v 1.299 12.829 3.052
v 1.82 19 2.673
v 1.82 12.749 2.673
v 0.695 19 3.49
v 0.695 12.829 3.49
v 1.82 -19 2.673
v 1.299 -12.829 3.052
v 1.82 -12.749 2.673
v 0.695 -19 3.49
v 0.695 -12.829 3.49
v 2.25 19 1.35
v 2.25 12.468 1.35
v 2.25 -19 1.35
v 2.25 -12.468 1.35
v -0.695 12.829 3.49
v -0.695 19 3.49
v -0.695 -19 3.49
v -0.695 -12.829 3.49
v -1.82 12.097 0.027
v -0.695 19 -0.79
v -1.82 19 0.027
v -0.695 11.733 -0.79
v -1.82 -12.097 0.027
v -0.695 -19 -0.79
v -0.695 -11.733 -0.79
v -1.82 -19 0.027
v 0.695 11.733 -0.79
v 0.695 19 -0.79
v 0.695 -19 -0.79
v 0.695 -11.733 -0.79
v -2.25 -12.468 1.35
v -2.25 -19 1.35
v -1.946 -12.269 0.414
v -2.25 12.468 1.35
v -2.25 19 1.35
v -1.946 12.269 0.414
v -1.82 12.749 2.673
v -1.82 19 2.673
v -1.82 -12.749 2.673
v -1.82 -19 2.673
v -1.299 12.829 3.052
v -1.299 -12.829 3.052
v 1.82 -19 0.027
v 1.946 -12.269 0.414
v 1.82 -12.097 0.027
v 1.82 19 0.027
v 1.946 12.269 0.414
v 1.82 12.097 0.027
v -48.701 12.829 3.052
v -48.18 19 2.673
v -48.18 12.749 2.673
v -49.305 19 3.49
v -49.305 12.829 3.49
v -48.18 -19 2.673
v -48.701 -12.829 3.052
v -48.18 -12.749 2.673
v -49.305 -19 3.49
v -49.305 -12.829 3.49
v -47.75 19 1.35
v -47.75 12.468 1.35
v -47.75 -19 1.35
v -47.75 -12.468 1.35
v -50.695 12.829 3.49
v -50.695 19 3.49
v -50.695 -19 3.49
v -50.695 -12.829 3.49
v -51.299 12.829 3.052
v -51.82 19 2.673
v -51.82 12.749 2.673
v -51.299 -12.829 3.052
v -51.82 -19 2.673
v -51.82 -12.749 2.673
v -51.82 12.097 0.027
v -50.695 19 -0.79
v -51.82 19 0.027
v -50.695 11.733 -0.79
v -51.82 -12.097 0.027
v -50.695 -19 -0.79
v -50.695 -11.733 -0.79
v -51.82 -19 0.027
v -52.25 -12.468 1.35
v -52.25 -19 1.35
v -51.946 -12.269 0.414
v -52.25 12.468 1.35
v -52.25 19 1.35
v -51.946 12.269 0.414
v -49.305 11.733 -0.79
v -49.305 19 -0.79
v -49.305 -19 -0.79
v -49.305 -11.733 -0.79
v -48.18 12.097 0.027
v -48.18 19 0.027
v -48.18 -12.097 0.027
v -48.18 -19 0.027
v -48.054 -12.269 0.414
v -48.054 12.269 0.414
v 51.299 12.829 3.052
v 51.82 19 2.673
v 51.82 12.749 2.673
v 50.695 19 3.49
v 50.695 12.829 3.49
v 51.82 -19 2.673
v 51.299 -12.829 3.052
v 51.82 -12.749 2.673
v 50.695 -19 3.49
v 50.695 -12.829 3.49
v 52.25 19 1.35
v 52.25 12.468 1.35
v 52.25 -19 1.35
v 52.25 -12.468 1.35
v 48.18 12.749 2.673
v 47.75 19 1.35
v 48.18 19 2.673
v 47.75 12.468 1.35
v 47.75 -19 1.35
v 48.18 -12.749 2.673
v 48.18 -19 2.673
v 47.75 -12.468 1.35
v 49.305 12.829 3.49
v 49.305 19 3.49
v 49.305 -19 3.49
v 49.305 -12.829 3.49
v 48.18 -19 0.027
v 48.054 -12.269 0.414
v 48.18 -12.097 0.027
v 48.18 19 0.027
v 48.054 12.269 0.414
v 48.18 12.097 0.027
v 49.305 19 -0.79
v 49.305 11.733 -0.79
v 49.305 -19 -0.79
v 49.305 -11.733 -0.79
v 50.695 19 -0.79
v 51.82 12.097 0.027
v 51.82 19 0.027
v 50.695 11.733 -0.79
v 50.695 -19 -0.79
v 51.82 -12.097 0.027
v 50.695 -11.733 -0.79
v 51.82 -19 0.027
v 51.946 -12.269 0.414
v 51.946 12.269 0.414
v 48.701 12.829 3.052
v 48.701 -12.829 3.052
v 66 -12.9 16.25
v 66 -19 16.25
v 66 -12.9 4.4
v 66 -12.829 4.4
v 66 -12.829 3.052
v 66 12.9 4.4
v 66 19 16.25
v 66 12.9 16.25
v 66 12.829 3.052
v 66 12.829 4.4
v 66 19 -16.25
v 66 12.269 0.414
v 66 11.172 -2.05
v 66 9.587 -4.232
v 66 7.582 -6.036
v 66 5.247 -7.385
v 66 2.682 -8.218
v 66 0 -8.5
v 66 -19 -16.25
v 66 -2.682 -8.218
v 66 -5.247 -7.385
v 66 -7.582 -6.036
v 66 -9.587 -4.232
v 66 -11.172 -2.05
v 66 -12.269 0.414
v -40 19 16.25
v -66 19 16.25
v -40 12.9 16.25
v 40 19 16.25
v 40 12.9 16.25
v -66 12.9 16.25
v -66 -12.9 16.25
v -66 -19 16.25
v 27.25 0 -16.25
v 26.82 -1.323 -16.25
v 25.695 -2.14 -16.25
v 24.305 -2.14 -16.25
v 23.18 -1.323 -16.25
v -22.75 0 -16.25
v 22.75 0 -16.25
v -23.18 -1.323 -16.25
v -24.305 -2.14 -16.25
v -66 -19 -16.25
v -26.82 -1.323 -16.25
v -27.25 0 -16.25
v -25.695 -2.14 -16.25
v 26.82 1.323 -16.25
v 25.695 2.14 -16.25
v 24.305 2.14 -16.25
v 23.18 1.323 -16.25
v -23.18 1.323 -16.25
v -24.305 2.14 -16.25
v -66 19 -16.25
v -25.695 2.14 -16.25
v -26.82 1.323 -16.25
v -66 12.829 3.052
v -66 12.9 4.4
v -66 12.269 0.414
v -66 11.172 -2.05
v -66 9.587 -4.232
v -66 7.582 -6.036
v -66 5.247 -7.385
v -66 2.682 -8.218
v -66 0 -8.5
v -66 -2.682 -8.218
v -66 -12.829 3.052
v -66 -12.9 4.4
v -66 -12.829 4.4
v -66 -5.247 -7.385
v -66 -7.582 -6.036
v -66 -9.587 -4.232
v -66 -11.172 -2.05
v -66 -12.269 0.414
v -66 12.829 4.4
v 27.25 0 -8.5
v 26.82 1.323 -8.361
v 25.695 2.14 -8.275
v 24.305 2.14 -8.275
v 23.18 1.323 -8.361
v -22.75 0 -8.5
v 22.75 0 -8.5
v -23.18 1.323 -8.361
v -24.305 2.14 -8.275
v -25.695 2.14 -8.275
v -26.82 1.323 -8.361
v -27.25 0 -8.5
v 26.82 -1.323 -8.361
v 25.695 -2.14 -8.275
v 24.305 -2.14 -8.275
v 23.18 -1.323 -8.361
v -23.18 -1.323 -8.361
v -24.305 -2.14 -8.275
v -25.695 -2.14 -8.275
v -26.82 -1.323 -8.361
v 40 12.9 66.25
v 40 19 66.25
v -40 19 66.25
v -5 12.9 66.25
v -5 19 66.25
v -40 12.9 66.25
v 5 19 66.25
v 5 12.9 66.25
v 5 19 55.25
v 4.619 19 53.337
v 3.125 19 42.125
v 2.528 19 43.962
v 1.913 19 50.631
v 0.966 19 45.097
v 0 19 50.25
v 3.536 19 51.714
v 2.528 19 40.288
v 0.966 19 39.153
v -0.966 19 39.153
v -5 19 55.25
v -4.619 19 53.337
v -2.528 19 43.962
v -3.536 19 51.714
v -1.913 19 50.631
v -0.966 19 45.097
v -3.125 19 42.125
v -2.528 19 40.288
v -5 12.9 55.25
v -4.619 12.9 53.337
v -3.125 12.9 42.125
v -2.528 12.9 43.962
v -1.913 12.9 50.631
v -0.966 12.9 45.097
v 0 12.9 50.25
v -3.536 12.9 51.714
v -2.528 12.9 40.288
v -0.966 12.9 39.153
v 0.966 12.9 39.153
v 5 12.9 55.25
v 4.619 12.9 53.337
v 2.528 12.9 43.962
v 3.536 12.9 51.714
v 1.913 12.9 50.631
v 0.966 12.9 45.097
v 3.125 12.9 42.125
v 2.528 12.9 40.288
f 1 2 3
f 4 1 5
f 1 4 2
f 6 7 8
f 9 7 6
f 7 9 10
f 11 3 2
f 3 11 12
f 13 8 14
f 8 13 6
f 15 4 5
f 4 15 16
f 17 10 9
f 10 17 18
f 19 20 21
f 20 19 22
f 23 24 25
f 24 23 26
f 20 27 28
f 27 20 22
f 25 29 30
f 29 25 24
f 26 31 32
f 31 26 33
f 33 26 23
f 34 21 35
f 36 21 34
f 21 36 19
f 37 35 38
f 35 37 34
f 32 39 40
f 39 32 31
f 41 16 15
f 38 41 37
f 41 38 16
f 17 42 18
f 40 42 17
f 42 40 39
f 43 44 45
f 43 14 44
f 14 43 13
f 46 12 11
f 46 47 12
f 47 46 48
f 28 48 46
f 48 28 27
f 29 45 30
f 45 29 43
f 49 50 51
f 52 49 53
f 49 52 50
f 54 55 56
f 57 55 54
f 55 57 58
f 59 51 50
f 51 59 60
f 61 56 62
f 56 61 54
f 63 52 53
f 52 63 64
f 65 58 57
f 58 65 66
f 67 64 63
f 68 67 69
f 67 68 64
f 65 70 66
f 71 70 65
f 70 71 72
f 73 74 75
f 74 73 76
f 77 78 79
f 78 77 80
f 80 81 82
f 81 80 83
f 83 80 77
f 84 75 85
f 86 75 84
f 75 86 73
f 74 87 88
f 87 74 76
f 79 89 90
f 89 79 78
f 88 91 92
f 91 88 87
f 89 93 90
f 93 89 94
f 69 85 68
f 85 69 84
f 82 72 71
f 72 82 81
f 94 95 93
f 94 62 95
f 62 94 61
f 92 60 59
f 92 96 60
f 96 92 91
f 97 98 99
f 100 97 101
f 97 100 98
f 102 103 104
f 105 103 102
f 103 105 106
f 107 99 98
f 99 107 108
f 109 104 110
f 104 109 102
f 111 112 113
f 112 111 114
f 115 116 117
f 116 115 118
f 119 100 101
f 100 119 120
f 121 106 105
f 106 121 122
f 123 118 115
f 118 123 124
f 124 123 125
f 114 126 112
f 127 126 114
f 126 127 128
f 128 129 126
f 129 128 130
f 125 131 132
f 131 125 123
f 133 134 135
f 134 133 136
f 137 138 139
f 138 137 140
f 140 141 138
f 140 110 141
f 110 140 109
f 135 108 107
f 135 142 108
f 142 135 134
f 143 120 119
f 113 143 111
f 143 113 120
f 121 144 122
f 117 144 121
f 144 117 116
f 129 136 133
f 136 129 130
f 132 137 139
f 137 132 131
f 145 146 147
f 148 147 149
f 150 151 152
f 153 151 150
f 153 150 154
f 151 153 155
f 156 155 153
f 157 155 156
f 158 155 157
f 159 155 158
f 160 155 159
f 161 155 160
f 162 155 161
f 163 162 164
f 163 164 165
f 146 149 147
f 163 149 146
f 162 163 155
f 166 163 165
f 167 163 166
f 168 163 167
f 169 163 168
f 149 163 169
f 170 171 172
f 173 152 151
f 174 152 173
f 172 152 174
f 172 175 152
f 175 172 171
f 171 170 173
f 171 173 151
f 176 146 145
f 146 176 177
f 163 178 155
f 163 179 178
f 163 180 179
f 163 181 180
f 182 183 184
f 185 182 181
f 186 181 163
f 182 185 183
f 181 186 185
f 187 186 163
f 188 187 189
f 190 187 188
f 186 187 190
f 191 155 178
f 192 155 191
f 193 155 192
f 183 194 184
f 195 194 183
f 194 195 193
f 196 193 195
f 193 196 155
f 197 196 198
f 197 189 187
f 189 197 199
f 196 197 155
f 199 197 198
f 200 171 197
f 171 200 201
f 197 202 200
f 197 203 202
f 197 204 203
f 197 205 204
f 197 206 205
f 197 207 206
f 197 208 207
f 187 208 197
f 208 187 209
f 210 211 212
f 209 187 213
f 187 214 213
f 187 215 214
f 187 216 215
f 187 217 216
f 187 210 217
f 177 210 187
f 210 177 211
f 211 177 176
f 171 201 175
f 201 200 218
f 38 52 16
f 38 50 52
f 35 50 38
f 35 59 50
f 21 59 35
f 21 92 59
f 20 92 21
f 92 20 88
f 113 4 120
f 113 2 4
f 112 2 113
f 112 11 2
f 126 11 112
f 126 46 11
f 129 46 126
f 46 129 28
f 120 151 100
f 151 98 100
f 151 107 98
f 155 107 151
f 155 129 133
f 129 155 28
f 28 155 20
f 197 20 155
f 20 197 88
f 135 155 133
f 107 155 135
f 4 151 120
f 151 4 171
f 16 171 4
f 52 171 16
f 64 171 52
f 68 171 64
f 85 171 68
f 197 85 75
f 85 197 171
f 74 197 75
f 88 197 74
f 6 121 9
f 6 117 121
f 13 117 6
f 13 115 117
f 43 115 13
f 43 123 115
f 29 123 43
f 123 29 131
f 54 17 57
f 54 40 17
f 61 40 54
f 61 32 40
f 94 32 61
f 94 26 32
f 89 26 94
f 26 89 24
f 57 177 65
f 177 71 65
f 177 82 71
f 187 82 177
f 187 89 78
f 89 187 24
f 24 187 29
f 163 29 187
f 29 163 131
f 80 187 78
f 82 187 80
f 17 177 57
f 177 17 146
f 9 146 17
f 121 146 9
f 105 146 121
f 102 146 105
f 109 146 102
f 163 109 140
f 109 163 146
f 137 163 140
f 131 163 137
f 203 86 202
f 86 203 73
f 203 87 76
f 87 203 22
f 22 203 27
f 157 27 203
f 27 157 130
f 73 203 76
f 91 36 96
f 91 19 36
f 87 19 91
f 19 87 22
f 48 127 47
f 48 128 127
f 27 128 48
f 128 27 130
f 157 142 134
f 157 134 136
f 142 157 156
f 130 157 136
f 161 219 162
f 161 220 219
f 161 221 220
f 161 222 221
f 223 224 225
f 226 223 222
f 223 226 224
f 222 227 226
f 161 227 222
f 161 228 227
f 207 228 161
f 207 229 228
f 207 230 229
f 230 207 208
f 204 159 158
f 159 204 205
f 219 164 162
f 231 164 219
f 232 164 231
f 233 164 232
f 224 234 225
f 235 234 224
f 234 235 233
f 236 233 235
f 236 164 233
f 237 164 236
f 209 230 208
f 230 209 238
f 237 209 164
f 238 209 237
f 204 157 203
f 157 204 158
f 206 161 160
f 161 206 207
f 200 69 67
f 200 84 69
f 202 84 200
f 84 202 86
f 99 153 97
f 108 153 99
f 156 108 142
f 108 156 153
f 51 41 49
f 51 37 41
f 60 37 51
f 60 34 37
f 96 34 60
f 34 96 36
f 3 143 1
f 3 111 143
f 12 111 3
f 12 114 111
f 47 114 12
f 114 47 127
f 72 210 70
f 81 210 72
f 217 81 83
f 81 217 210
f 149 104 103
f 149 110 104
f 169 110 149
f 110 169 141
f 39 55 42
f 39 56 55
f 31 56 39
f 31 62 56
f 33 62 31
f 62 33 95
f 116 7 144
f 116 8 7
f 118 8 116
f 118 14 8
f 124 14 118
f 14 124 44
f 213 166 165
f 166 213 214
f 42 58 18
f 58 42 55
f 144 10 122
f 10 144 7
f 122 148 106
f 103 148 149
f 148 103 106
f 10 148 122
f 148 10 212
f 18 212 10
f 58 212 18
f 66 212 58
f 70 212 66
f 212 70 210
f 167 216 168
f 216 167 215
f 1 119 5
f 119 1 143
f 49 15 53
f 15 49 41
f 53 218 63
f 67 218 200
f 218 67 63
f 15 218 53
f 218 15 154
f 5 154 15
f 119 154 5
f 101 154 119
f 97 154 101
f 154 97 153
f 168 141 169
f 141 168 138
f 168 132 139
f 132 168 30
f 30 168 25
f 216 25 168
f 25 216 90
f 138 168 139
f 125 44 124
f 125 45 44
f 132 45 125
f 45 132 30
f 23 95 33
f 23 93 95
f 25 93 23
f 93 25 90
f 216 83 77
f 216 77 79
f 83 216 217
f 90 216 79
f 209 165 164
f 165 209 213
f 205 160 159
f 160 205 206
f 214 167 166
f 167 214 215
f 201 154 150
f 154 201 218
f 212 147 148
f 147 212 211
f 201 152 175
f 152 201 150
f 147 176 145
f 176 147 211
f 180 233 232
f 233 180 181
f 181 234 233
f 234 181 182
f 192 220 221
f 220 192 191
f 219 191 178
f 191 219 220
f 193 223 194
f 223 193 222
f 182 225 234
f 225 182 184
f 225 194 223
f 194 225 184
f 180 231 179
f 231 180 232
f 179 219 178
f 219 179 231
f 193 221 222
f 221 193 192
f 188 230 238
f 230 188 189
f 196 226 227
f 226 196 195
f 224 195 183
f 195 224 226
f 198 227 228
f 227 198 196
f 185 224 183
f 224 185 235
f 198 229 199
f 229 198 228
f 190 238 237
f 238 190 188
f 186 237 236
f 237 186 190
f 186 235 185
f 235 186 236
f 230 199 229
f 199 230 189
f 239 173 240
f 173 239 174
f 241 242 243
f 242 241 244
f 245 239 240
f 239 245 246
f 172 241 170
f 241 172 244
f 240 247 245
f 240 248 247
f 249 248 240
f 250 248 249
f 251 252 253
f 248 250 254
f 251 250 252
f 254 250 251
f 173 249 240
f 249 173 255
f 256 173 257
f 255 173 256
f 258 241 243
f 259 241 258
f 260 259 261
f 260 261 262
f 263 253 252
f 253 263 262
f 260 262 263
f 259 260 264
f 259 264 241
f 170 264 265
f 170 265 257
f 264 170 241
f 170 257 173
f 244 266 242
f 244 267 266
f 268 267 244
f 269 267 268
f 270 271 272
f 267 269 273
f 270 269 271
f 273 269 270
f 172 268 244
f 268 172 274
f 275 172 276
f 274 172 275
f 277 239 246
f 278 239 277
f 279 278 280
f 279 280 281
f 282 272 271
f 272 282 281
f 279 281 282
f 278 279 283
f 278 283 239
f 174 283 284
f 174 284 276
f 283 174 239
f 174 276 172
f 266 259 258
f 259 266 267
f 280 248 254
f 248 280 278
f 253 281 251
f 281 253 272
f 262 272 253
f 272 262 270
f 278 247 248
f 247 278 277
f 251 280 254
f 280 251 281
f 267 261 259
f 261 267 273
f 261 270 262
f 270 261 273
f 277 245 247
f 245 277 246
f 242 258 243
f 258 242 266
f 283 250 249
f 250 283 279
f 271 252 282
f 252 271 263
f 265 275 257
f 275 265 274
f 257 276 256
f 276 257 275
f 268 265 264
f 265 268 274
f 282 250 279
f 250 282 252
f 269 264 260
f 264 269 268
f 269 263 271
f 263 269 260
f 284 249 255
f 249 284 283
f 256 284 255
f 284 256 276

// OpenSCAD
nakladka_sz = 38; //31.4
nakladka_dl = 132;
nakladka_h = 32.5;
dno_grubosc = 7.75;

rama_sr = 25.8;

sruba_sr = 4.5;
sruba_od_dna = 15.35;
sruba_od_boku = 12.7;
sruby_odstep = 50;

mocowanie_h = 50; //35
mocowanie_sr1 = 10; // lub 12
mocowanie_gr = (nakladka_sz-rama_sr)/2;
mocowanie_dl = 80;

module sruba_dziura(sr){
    rotate([90,0,0]){
        cylinder(h=nakladka_sz+30, d=sr, center=true, $fn=10);
        
    }
}

module mocowanie(h, sr1, gr, dl, sr2){
    difference(){
    cube([dl, gr, h],center = true);
    
    translate([0,0,h/2-16+sr1/2]){
    rotate([90,0,0]){
      cylinder(gr+10, d=sr1, center=true);   
    }
    }
    translate([0,0,h-16+sr1/2]){
        cube([sr1, gr+10, h],center = true);
    }
    translate([0,0,h/2-16-sr2/2-5]){
    rotate([90,0,0]){
    cylinder(gr+10, d=sr2, center=true);
    }
    }
    
    }
}

union(){
    difference(){
        cube([nakladka_dl, nakladka_sz, nakladka_h], center=true);
        
        translate([0,0,-nakladka_h/2+dno_grubosc+rama_sr/2]){
        rotate([0,90,0]){
            cylinder(h=nakladka_dl+30, d=rama_sr, center=true);
            
        }
        }
        
        translate([0,0,dno_grubosc+rama_sr/2]){
            cube([nakladka_dl+30, rama_sr, nakladka_h],center = true);
        }
        translate([0,0,-nakladka_h/2+sruba_sr/2+sruba_od_dna]){
            sruba_dziura(sruba_sr);
            
            translate([-sruby_odstep,0,0]){
               sruba_dziura(sruba_sr); 
            }
            
             translate([sruby_odstep,0,0]){
               sruba_dziura(sruba_sr); 
            }
            
        }
        translate([25,0,0]){
            rotate([-90,0,0]){
                sruba_dziura(sruba_sr); 
            }
        }
         translate([-25,0,0]){
            rotate([-90,0,0]){
                sruba_dziura(sruba_sr); 
            }
        }
    }

    translate([0,nakladka_sz/2-mocowanie_gr/2,nakladka_h/2+mocowanie_h/2]){
        mocowanie(mocowanie_h, mocowanie_sr1, mocowanie_gr, mocowanie_dl, 6.25);
    }

}
